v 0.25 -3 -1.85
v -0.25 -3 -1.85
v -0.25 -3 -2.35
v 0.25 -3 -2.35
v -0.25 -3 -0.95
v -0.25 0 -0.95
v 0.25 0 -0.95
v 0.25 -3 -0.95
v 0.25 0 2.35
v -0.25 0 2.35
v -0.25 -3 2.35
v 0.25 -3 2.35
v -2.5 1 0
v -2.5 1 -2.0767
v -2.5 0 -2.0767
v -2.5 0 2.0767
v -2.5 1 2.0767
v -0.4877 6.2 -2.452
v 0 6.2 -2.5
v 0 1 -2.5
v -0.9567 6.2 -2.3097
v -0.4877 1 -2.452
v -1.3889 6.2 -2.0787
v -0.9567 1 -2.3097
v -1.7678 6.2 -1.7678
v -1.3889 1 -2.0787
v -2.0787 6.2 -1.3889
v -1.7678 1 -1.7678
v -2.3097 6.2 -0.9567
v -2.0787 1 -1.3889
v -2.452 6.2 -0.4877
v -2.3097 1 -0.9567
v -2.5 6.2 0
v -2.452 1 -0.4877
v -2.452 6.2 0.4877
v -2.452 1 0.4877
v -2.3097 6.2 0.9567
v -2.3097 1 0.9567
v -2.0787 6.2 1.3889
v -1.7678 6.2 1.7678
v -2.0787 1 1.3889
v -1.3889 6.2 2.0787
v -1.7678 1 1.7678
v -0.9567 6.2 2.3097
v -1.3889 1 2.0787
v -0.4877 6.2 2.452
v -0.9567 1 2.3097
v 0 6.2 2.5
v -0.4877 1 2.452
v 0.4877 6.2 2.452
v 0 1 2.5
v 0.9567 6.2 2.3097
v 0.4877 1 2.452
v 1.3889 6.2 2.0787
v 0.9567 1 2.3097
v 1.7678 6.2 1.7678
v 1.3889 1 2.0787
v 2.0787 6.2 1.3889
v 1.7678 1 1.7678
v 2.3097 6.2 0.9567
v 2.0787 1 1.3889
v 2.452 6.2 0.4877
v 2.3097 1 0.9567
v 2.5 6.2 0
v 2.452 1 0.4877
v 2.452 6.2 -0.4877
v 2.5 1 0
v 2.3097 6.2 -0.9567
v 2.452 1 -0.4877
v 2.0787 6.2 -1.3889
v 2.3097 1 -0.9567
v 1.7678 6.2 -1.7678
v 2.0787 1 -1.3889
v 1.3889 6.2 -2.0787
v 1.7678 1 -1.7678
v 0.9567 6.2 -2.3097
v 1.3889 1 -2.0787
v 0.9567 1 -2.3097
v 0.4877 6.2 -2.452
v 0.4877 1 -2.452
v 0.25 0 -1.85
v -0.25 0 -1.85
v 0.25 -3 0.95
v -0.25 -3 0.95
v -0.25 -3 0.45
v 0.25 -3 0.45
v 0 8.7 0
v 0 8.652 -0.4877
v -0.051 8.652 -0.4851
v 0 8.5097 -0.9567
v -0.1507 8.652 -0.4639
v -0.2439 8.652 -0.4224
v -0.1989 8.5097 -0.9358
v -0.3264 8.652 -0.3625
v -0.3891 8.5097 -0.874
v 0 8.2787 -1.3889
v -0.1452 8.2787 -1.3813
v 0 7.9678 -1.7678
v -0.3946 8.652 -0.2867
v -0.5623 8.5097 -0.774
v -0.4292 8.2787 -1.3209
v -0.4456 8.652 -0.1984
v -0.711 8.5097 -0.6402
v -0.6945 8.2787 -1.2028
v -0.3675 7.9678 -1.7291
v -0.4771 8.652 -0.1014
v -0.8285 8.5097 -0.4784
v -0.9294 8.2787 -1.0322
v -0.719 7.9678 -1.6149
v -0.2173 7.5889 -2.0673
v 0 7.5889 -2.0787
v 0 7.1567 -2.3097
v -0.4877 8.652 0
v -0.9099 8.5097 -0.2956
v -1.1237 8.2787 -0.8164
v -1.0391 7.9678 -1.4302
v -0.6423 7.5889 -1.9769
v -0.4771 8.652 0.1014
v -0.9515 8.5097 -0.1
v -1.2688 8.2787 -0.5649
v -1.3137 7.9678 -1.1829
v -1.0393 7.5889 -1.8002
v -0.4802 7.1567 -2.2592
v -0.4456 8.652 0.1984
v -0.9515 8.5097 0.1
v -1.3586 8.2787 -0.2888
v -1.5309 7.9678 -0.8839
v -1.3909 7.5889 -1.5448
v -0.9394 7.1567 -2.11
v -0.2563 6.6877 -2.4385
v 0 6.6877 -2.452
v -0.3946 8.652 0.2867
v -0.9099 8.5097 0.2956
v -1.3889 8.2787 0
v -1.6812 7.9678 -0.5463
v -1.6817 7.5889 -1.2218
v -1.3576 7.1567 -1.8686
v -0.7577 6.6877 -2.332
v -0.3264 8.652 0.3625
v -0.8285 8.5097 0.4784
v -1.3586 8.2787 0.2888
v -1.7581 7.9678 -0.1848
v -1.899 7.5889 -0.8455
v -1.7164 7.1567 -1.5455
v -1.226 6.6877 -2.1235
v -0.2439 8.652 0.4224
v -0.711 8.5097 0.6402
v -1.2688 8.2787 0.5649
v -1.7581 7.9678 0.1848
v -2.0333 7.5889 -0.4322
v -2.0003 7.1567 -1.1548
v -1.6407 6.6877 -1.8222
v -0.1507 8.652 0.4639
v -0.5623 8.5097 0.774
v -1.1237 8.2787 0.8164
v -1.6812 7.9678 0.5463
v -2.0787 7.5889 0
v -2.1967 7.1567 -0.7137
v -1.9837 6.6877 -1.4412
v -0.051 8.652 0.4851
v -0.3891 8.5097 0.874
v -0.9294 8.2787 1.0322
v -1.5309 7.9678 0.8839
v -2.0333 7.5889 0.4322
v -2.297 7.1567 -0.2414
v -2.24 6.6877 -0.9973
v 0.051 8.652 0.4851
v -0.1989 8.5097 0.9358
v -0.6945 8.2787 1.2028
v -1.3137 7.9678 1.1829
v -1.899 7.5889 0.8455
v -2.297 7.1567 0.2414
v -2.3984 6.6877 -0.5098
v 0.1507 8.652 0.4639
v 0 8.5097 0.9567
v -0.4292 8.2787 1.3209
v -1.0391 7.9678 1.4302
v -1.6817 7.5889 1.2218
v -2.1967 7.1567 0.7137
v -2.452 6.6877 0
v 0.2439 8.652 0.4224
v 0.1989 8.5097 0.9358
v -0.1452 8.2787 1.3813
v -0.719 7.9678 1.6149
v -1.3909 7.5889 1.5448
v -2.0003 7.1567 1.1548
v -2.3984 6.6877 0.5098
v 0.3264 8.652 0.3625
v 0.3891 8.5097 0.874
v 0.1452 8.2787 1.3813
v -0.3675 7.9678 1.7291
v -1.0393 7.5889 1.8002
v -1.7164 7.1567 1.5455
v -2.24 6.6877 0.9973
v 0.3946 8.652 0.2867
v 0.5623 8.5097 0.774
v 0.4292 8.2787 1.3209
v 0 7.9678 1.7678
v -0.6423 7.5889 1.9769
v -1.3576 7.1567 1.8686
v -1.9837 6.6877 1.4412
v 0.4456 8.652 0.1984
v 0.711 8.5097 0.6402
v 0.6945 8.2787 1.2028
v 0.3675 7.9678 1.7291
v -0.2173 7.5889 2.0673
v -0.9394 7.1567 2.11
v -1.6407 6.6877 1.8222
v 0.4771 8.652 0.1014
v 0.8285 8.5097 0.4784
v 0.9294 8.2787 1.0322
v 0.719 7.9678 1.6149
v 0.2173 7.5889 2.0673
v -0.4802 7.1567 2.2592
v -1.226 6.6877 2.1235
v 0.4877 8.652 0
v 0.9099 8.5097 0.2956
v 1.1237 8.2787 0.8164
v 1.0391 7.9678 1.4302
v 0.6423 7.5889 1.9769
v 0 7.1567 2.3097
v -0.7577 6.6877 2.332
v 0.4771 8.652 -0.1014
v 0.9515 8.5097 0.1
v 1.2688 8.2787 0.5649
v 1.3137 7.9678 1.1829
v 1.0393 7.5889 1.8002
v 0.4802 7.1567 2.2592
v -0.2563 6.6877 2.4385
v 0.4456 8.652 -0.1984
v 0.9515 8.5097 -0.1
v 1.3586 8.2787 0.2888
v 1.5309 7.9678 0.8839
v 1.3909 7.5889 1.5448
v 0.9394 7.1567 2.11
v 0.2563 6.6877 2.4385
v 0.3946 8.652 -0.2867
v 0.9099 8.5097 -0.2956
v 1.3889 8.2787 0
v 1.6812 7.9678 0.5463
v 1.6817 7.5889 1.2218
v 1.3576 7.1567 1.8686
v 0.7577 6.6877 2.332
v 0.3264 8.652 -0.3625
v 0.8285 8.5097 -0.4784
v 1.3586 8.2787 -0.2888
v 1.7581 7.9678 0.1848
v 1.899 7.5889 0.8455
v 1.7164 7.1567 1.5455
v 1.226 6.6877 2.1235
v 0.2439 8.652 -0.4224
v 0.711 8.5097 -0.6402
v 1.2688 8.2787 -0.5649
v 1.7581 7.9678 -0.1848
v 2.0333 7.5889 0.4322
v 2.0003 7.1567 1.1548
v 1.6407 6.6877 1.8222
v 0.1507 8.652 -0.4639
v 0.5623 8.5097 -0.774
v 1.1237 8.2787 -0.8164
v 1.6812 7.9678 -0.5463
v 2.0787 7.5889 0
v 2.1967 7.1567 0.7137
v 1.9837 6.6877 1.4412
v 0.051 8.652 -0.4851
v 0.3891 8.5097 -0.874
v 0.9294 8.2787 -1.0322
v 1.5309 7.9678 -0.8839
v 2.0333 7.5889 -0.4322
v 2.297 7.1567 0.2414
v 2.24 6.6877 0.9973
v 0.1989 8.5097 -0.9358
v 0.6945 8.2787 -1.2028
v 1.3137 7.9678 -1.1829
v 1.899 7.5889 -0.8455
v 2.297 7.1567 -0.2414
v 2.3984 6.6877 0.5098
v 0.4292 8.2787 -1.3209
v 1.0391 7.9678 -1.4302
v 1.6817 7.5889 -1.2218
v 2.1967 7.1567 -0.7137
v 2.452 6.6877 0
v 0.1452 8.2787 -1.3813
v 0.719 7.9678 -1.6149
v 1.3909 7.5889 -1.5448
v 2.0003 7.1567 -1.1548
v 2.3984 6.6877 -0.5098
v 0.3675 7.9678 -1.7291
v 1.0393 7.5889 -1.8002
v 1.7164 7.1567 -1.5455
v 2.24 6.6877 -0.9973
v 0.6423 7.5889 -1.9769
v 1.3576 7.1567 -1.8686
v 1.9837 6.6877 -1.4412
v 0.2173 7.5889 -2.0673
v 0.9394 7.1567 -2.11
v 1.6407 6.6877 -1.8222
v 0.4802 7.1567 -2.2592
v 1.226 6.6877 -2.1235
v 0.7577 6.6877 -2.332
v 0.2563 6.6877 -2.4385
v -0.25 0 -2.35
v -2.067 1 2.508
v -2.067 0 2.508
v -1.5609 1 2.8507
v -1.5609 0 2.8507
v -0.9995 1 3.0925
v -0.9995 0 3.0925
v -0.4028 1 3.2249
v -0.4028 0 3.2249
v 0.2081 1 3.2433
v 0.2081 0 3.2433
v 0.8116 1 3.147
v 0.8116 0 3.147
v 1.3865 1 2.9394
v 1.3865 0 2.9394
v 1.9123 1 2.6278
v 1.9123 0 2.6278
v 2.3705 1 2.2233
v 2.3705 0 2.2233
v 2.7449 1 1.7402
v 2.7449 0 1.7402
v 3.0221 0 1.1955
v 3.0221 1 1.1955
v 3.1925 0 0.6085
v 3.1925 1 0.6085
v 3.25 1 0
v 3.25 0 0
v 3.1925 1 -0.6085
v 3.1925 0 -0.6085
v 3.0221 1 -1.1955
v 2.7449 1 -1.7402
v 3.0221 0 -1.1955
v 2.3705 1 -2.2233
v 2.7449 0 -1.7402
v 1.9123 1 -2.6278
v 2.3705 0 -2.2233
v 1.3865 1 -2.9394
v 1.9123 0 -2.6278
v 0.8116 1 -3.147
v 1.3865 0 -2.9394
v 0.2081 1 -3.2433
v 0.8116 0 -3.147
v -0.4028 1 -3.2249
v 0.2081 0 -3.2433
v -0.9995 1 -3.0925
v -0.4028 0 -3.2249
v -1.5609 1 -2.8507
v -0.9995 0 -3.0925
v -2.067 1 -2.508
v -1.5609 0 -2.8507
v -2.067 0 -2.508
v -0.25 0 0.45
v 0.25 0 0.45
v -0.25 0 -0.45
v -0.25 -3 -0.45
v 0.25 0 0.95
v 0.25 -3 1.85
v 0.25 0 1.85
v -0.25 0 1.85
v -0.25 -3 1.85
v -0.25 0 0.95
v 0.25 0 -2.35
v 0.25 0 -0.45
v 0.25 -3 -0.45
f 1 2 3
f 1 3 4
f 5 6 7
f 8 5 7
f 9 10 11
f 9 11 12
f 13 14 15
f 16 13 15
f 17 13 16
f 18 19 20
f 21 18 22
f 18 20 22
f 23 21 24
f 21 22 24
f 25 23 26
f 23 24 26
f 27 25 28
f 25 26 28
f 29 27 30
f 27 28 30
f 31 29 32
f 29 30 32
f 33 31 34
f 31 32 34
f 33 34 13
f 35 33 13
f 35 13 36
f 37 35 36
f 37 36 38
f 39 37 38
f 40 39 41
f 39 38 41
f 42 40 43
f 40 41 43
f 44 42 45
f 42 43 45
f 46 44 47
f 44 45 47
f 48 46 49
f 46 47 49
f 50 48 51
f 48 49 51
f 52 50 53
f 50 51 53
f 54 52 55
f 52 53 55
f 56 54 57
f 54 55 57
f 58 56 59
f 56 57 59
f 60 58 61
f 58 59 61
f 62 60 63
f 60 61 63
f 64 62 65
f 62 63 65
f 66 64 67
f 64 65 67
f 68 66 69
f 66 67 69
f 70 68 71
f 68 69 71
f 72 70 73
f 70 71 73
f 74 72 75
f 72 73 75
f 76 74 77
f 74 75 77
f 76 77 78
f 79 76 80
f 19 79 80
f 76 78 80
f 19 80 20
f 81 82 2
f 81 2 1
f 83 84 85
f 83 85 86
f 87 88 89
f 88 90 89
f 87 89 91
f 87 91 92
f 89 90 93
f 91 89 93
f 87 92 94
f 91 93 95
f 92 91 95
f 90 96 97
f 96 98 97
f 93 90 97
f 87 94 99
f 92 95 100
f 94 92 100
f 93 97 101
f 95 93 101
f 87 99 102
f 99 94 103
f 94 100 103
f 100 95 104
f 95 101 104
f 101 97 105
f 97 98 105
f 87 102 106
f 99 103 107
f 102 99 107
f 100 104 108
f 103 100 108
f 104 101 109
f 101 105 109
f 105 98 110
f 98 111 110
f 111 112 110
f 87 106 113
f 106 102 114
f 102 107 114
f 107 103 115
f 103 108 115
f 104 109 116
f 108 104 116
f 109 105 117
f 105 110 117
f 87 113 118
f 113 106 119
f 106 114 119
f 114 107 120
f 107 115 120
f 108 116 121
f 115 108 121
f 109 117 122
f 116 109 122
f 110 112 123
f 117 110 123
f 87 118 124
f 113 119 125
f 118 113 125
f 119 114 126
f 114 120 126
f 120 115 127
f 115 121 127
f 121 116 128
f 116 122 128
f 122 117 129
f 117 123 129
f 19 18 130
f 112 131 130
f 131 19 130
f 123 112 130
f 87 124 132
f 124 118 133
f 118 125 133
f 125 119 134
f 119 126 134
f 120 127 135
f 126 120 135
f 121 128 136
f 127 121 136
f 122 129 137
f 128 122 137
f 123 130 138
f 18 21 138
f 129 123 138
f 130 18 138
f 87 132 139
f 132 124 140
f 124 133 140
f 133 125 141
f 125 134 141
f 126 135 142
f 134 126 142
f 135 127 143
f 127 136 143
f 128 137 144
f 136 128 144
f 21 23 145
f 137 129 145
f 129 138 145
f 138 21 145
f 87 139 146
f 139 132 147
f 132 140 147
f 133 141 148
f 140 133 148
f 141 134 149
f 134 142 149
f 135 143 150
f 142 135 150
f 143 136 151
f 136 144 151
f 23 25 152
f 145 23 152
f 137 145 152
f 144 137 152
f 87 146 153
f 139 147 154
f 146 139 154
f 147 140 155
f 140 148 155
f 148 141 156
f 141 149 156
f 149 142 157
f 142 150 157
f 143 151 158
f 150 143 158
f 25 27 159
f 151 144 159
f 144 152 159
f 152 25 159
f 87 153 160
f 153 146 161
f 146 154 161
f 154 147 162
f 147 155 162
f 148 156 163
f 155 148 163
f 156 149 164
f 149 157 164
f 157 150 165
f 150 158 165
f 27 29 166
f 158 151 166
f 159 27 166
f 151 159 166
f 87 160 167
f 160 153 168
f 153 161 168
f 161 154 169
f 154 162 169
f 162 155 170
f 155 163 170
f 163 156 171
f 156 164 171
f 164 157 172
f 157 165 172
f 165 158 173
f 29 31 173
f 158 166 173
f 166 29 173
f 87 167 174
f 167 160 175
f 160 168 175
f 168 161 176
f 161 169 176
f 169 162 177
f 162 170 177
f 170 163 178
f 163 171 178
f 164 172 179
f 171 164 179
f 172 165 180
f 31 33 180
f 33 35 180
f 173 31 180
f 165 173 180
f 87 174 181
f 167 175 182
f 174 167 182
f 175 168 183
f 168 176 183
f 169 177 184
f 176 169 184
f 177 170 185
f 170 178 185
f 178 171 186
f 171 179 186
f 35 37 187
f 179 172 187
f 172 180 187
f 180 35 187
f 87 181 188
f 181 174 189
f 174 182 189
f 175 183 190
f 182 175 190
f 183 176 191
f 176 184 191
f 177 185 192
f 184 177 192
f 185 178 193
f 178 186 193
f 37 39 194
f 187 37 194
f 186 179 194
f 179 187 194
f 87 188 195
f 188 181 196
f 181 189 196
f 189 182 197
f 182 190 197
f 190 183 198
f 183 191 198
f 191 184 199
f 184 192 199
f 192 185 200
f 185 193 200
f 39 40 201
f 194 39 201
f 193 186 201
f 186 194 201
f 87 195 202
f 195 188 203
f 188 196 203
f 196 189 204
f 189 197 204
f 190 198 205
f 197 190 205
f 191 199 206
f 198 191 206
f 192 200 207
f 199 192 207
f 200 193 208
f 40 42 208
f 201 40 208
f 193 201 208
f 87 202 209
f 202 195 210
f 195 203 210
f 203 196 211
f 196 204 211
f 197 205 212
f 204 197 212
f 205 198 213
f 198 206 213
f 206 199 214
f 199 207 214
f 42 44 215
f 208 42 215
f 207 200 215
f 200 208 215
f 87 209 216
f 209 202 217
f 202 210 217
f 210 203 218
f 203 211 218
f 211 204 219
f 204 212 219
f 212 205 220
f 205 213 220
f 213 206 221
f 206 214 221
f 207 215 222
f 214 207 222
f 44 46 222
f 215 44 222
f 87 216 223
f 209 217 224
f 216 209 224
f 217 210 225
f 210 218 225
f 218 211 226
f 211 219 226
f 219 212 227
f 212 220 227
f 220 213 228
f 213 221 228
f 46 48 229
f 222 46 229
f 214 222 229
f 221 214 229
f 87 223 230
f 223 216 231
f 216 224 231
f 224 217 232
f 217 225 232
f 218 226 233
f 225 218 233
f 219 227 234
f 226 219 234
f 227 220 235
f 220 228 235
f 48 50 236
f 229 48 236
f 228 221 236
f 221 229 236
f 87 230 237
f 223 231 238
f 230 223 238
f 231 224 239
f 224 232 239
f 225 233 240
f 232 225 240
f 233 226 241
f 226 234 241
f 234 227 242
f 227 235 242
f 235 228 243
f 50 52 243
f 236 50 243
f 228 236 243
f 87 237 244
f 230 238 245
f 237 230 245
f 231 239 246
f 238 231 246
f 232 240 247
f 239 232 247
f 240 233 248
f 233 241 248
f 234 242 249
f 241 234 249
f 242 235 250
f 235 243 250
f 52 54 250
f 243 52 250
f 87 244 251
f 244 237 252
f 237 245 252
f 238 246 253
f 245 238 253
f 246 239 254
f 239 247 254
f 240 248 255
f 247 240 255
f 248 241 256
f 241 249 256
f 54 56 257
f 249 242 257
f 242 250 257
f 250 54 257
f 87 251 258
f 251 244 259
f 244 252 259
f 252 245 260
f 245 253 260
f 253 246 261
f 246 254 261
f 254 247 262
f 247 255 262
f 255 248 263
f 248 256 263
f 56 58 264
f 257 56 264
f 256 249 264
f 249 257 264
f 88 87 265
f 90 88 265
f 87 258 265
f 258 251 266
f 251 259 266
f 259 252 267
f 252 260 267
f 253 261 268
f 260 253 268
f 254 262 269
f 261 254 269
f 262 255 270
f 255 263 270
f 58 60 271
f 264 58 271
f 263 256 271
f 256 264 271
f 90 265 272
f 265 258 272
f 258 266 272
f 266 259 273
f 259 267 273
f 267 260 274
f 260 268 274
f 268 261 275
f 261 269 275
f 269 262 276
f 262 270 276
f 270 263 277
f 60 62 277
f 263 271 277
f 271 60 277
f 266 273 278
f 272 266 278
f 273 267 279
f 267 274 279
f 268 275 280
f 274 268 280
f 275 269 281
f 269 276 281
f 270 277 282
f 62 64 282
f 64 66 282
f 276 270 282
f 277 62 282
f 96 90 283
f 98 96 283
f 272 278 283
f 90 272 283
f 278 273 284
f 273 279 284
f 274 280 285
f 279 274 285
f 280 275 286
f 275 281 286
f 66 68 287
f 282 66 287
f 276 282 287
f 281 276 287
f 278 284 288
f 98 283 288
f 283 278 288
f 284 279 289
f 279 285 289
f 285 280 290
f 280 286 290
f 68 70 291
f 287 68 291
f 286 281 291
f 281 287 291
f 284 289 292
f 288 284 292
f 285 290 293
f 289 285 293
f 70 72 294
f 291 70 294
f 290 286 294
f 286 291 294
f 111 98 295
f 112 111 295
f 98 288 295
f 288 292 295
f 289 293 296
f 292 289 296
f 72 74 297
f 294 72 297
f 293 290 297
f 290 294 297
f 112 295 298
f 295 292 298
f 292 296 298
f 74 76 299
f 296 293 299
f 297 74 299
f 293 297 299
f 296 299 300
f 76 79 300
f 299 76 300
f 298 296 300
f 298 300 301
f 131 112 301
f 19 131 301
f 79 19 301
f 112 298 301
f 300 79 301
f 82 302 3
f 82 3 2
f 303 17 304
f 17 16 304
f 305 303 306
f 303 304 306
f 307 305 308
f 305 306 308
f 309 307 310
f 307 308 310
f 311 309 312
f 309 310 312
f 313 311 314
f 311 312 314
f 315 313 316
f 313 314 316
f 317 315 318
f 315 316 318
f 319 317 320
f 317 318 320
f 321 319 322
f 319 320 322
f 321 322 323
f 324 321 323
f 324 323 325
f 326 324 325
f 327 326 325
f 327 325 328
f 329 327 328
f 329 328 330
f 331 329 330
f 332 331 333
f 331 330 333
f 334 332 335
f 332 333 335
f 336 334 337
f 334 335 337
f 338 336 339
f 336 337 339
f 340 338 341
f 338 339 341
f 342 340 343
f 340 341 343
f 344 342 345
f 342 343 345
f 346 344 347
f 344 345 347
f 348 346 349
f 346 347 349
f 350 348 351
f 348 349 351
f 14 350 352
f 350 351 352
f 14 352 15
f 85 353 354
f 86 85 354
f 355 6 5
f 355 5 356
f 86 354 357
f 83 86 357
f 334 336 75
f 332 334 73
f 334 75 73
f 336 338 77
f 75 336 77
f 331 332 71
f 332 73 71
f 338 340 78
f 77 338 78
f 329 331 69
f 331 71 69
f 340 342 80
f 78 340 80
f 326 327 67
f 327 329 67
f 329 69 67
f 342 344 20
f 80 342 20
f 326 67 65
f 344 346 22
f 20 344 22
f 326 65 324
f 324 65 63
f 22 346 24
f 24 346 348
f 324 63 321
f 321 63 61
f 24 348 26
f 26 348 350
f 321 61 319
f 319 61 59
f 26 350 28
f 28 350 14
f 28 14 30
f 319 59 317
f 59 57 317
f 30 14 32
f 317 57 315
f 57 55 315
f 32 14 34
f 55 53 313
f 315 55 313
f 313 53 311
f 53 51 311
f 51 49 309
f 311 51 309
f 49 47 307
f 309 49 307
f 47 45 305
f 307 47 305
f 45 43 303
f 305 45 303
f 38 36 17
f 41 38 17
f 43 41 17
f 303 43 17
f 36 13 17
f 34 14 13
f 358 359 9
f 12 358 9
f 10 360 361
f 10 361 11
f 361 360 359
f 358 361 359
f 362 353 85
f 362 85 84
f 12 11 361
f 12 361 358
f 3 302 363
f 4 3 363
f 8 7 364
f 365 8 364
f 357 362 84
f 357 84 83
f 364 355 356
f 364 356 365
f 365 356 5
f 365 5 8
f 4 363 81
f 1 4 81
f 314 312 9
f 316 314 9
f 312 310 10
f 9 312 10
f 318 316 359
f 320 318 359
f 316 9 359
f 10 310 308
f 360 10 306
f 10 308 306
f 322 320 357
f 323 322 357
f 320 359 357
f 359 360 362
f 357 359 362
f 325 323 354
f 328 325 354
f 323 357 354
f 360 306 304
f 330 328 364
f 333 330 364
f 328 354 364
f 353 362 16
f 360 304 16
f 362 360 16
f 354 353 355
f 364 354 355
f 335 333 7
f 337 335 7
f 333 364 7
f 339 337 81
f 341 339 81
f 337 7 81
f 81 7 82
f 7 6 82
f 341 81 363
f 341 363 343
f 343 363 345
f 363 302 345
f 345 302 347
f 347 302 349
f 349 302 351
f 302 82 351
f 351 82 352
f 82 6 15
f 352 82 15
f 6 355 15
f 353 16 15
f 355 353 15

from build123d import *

# Parameters (mm, degrees)
CUT_EXTRUDE_2_REACH = 10.967
SKETCH_5_W          = 0.5
SKETCH_5_H          = 0.5
EXTRUDE_1_DEPTH     = 3


with BuildPart() as part:
    # Эскиз1 → Повернуть1 (revolve)
    with BuildSketch(Plane(origin=(0, 0, 0), x_dir=(0, 0, -1), z_dir=(1, 0, 0)), mode=Mode.PRIVATE) as revolve_1_sk:
        with BuildLine():
            Line((-2.5, 1), (0, 1))
            Line((0, 1), (0, 8.7))
            ThreePointArc((0, 8.7), (-1.767766953, 7.967766953), (-2.5, 6.2))
            Line((-2.5, 6.2), (-2.5, 1))
        make_face()
        Polygon((-3.25, 1), (-3.25, 0), (0, 0), (0, 1), (-2.5, 1), align=None)
    revolve(revolve_1_sk.sketch.rotate(Axis((0, -2.603301624, 0), (0, 1, 0)), 180), axis=Axis((0, -2.603301624, 0), (0, 1, 0)))

    # Эскиз4 → Вырез-Вытянуть2 (cut, up to next)
    with BuildSketch(Plane(origin=(0, 1, 0), x_dir=(1, 0, 0), z_dir=(0, 1, 0)), mode=Mode.PRIVATE) as cut_extrude_2_sk1:
        with BuildLine():
            Line((-2.5, 2.076655966), (-2.5, -2.076655966))
            ThreePointArc((-2.5, -2.076655966), (-3.25, 0), (-2.5, 2.076655966))
        make_face()
    cut_extrude_2_tool1 = extrude(cut_extrude_2_sk1.sketch, amount=-CUT_EXTRUDE_2_REACH, mode=Mode.PRIVATE) & part.part
    add(cut_extrude_2_tool1.solids().sort_by_distance((-2.80318, 1, 0))[0], mode=Mode.SUBTRACT)

    # Эскиз5 → Бобышка-Вытянуть1 (add)
    with BuildSketch(Plane.XZ):
        with Locations((0, 0.7)):
            Rectangle(SKETCH_5_W, SKETCH_5_H)
        with Locations((0, 2.1)):
            Rectangle(SKETCH_5_W, SKETCH_5_H)
        with Locations((0, -0.7)):
            Rectangle(SKETCH_5_W, SKETCH_5_H)
        with Locations((0, -2.1)):
            Rectangle(SKETCH_5_W, SKETCH_5_H)
    extrude(amount=EXTRUDE_1_DEPTH)


solid = part.part
